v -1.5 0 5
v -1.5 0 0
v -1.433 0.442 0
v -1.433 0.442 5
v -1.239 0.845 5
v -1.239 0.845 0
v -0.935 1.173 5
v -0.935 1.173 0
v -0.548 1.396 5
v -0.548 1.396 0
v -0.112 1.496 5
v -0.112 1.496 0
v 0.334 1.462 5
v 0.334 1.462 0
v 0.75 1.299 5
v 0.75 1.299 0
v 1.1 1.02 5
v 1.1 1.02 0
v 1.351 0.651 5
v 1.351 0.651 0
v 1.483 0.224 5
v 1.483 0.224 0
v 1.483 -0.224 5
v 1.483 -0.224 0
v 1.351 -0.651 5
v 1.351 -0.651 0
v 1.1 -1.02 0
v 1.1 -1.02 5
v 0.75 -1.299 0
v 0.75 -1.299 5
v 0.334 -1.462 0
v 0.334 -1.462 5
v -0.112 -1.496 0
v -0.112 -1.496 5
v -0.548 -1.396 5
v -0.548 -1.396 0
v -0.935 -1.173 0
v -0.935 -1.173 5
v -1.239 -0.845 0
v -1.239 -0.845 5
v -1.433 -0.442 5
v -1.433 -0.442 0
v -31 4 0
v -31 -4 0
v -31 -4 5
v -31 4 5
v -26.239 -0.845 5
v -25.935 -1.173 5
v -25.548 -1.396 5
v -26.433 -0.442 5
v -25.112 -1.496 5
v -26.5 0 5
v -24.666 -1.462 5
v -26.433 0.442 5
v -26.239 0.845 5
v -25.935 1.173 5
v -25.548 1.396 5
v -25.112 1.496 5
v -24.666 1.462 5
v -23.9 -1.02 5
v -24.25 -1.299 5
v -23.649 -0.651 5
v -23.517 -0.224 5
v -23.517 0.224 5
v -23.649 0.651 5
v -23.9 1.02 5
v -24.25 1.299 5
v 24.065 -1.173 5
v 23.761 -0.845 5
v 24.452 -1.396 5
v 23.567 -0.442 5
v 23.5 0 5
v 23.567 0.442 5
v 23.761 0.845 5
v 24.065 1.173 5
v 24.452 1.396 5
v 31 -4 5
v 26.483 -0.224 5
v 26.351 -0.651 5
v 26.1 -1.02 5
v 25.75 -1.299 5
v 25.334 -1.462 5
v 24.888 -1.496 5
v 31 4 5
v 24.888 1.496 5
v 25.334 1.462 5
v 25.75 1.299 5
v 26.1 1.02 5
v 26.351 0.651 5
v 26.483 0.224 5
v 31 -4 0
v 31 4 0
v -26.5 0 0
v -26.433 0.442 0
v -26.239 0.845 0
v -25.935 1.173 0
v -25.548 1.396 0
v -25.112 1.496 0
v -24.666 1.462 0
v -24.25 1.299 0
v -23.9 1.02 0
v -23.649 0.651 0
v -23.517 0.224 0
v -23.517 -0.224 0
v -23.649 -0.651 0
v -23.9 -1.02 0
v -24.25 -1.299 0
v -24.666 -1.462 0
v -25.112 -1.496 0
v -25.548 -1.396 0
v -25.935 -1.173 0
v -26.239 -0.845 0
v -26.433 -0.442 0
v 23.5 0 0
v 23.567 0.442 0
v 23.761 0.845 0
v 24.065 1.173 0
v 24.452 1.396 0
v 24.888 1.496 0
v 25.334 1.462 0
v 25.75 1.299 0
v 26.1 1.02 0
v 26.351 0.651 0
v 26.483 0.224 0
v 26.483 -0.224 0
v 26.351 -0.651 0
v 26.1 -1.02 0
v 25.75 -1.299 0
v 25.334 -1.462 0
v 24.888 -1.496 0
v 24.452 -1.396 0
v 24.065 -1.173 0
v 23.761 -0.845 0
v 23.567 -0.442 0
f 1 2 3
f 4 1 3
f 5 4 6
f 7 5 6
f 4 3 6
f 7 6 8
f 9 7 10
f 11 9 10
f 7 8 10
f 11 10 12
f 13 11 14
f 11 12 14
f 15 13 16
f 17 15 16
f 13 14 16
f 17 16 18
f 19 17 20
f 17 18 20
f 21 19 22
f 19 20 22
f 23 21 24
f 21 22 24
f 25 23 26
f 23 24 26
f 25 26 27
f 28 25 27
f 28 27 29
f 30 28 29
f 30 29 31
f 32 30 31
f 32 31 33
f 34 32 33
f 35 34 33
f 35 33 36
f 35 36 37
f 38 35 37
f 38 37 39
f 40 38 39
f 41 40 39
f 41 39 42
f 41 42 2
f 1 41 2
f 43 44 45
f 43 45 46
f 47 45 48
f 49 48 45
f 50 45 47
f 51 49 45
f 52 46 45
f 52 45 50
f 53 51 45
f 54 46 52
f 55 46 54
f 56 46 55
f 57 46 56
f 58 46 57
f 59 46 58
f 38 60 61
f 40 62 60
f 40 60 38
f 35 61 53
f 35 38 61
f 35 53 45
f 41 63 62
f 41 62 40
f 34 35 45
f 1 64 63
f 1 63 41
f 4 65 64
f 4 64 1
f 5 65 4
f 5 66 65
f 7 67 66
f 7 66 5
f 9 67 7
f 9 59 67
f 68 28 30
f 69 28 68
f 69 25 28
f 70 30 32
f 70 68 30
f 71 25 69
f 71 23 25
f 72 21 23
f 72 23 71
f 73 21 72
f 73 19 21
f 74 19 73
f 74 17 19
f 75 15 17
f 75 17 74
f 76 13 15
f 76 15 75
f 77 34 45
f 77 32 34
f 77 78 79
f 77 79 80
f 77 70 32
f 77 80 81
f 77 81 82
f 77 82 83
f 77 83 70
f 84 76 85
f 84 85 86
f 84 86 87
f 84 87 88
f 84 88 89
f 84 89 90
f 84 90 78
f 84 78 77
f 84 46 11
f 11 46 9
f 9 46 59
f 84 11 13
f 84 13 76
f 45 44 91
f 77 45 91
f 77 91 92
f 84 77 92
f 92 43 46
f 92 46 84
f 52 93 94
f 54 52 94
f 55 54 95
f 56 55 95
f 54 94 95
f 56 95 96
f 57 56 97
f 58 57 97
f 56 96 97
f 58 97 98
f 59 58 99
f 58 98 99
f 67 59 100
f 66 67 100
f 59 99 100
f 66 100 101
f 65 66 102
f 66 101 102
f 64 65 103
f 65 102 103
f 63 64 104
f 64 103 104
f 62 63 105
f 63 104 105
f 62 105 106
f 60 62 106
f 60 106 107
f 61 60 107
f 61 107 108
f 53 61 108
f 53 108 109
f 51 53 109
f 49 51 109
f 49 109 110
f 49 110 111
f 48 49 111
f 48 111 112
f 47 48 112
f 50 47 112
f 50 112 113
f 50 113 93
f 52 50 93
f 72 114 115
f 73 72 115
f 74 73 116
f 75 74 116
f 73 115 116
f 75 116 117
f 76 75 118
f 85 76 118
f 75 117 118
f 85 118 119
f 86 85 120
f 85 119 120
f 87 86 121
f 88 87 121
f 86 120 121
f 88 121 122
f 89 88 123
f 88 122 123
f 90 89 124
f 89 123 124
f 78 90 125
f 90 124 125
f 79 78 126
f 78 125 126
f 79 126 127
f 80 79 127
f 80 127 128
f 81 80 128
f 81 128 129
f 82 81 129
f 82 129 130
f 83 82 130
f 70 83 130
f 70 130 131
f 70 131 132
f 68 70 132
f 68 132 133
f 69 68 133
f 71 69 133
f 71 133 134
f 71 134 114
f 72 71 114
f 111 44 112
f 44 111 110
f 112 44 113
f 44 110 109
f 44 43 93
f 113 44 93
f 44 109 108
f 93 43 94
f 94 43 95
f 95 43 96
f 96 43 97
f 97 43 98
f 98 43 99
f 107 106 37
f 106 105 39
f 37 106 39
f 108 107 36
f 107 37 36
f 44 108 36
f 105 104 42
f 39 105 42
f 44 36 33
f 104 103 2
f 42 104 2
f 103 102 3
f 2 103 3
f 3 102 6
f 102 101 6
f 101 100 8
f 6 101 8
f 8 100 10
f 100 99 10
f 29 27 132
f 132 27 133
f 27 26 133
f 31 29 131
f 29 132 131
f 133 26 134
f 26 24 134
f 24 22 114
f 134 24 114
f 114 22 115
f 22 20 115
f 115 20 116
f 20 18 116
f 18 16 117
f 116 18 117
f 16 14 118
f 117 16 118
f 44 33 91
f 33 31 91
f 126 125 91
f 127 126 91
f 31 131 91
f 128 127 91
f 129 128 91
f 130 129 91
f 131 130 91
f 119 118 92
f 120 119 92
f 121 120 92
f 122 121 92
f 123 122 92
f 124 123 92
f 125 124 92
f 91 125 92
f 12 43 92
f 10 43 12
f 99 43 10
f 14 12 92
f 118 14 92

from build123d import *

# Parameters (mm, degrees)
SKETCH1_W           = 62
SKETCH1_H           = 8
BOSS_EXTRUDE1_DEPTH = 5
SKETCH2_R           = 1.5
CUT_EXTRUDE1_DEPTH  = 10


with BuildPart() as part:
    # Sketch1 → Boss-Extrude1 (new body)
    with BuildSketch(Plane.XY):
        Rectangle(SKETCH1_W, SKETCH1_H)
    extrude(amount=BOSS_EXTRUDE1_DEPTH)

    # Sketch2 → Cut-Extrude1 (cut)
    with BuildSketch(Plane(origin=(0, 0, 0), x_dir=(-1, 0, 0), z_dir=(0, 0, -1))):
        with Locations((-25, 0)):
            Circle(SKETCH2_R)
        Circle(SKETCH2_R)
        with Locations((25, 0)):
            Circle(SKETCH2_R)
    extrude(amount=-CUT_EXTRUDE1_DEPTH, mode=Mode.SUBTRACT)


solid = part.part
